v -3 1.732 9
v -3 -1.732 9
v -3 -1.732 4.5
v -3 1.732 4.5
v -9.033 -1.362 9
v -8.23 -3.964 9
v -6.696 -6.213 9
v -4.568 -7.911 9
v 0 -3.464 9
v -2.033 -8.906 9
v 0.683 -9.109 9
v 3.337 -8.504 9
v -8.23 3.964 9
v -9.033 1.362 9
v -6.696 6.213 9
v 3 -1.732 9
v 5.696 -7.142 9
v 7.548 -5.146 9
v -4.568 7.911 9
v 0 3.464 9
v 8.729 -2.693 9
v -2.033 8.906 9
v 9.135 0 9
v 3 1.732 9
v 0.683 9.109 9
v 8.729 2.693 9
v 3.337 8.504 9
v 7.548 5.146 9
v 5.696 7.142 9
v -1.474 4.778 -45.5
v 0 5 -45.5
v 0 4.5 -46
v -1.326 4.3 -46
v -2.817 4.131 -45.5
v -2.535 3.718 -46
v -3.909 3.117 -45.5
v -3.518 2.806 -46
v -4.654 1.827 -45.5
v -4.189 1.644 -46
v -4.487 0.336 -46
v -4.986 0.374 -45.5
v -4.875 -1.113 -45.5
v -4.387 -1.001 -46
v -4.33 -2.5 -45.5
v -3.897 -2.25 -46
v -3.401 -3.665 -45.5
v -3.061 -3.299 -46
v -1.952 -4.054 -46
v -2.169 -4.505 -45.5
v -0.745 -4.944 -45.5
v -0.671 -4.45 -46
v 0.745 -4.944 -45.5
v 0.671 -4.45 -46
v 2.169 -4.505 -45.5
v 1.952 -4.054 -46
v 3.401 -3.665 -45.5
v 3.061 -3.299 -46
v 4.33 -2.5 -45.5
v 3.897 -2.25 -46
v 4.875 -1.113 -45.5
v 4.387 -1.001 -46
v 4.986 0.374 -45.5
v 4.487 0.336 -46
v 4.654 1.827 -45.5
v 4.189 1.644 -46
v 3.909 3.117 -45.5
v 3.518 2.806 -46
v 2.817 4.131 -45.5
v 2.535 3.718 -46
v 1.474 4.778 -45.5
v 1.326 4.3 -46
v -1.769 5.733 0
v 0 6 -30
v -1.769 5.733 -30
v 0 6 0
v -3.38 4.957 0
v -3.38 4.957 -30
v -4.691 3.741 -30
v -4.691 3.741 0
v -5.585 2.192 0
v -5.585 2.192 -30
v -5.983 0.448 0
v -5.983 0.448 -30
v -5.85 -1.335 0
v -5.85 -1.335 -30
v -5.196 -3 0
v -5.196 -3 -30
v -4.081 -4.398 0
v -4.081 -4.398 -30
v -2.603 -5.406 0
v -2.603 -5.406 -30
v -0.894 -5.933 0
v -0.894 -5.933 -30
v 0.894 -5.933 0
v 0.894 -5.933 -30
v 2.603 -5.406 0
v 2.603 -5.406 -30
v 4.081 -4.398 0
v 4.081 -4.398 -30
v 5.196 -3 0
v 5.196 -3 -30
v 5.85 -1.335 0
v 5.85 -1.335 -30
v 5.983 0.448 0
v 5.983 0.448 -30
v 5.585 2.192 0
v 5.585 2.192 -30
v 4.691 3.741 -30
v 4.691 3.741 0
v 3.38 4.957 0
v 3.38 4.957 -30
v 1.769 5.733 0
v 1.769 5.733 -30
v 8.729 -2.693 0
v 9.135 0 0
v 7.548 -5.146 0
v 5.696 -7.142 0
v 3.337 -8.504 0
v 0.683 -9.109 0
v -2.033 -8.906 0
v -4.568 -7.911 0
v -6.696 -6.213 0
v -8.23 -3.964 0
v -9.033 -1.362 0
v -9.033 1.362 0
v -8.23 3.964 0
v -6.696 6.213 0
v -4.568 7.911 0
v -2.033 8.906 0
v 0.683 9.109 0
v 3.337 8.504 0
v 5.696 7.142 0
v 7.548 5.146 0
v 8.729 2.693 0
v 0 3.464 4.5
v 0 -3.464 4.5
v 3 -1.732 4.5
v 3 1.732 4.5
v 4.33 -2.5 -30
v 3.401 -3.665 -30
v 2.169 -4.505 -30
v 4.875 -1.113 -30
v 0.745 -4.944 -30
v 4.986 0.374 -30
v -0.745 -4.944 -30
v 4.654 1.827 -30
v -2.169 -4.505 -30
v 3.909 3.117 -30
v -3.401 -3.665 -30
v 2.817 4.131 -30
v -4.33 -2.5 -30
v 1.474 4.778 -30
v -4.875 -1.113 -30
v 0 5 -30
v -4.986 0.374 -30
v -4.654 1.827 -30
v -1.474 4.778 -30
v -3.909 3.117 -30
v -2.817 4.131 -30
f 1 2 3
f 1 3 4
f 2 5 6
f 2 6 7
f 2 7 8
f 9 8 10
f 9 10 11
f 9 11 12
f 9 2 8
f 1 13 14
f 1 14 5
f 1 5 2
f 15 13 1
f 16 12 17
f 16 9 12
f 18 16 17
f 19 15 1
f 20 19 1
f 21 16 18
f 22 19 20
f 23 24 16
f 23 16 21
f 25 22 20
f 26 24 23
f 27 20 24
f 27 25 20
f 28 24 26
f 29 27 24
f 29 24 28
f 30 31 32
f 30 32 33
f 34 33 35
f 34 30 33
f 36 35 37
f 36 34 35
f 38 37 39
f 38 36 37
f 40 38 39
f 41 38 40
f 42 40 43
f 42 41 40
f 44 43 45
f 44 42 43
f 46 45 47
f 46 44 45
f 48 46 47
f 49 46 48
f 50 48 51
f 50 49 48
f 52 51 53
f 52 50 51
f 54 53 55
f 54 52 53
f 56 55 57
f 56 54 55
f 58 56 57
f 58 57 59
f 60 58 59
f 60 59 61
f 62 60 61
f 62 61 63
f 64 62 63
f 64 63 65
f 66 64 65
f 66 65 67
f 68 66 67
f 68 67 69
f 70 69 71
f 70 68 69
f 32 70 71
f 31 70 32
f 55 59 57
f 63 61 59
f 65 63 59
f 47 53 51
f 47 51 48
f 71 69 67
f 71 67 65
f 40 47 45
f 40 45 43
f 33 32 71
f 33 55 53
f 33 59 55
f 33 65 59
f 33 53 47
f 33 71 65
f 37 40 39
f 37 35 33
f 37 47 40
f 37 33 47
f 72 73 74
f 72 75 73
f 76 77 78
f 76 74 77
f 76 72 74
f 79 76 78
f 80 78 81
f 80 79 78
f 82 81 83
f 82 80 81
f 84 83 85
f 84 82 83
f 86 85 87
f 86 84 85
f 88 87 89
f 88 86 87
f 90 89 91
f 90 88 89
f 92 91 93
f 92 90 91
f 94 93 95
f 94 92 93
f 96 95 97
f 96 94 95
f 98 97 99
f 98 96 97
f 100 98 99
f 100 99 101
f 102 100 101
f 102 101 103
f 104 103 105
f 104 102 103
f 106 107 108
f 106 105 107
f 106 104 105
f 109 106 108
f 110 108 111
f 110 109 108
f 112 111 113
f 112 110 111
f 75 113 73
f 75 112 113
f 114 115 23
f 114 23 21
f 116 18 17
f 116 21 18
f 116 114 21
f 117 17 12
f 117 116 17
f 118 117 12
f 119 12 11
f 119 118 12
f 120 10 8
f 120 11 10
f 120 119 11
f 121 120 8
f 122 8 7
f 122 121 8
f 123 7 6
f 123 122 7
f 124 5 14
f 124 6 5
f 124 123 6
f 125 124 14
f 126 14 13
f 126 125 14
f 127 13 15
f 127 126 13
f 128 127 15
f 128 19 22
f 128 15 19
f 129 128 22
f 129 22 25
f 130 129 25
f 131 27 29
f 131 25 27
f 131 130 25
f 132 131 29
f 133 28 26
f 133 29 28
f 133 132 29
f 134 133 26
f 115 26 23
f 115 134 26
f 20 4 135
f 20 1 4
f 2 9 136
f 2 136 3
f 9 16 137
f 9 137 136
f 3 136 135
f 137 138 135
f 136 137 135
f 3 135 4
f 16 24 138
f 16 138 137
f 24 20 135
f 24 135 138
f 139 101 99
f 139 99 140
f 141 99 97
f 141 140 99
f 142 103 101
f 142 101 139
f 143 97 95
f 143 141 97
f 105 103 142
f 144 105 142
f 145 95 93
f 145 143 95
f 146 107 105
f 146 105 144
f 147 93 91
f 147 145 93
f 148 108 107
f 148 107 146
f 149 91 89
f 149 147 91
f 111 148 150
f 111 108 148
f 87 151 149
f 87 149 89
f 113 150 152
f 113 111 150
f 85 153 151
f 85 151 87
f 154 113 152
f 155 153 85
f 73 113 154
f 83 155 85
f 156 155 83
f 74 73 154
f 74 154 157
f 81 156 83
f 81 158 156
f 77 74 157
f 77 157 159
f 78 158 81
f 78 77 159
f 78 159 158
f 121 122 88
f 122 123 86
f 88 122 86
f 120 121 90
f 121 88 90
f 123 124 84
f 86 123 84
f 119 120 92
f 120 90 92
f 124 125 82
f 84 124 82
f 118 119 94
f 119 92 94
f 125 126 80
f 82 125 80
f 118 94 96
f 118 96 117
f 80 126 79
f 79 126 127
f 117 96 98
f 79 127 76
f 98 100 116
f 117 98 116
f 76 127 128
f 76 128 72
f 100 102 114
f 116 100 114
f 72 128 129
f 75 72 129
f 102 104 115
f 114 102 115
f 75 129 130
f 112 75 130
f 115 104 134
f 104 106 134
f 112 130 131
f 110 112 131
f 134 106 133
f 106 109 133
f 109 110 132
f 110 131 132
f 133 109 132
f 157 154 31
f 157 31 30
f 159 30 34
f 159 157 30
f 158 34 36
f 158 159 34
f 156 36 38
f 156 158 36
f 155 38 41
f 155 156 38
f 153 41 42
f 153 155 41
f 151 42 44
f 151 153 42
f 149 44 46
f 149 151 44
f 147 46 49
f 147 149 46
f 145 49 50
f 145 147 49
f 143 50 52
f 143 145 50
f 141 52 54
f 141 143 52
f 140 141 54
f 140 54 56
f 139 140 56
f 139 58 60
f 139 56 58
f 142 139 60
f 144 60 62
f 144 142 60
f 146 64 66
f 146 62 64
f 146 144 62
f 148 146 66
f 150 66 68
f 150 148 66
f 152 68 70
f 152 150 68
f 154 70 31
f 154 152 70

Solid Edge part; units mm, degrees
sketch "Sketch1" plane through (0, 0, 0) normal (0, 0, 1) x (1, 0, 0)
  circle A0 centre (0, 0) radius 9.135
  dimension "D1" = 18.27
extrude "Protrusion1" add sketch "Sketch1" along normal blind 9
sketch "Sketch2" plane through (0, 0, 9) normal (0, 0, 1) x (1, 0, 0)
  line L0 (0, -3.4641) -> (-3, -1.7321)
  line L1 (-3, -1.7321) -> (-3, 1.7321)
  line L2 (-3, 1.7321) -> (0, 3.4641)
  line L3 (0, 3.4641) -> (3, 1.7321)
  line L4 (3, 1.7321) -> (3, -1.7321)
  line L5 (3, -1.7321) -> (0, -3.4641)
  dimension "D1" = 6
extrude "Cutout1" cut sketch "Sketch2" against normal blind 4.5
sketch "Sketch3" plane through (0, 0, 0) normal (0, 0, -1) x (0, 1, 0)
  circle A0 centre (0, 0) radius 6
  dimension "D1" = 12
extrude "Protrusion2" add sketch "Sketch3" along normal blind 30
sketch "Sketch4" plane through (0, 0, -30) normal (0, 0, -1) x (0, 1, 0)
  circle A0 centre (0, 0) radius 5
  dimension "D1" = 10
extrude "Protrusion3" add sketch "Sketch4" along normal blind 16
chamfer "Chamfer1" distance 0.5 angle 45 1 edges at (0, -5, -46)
properties part number "108080"
